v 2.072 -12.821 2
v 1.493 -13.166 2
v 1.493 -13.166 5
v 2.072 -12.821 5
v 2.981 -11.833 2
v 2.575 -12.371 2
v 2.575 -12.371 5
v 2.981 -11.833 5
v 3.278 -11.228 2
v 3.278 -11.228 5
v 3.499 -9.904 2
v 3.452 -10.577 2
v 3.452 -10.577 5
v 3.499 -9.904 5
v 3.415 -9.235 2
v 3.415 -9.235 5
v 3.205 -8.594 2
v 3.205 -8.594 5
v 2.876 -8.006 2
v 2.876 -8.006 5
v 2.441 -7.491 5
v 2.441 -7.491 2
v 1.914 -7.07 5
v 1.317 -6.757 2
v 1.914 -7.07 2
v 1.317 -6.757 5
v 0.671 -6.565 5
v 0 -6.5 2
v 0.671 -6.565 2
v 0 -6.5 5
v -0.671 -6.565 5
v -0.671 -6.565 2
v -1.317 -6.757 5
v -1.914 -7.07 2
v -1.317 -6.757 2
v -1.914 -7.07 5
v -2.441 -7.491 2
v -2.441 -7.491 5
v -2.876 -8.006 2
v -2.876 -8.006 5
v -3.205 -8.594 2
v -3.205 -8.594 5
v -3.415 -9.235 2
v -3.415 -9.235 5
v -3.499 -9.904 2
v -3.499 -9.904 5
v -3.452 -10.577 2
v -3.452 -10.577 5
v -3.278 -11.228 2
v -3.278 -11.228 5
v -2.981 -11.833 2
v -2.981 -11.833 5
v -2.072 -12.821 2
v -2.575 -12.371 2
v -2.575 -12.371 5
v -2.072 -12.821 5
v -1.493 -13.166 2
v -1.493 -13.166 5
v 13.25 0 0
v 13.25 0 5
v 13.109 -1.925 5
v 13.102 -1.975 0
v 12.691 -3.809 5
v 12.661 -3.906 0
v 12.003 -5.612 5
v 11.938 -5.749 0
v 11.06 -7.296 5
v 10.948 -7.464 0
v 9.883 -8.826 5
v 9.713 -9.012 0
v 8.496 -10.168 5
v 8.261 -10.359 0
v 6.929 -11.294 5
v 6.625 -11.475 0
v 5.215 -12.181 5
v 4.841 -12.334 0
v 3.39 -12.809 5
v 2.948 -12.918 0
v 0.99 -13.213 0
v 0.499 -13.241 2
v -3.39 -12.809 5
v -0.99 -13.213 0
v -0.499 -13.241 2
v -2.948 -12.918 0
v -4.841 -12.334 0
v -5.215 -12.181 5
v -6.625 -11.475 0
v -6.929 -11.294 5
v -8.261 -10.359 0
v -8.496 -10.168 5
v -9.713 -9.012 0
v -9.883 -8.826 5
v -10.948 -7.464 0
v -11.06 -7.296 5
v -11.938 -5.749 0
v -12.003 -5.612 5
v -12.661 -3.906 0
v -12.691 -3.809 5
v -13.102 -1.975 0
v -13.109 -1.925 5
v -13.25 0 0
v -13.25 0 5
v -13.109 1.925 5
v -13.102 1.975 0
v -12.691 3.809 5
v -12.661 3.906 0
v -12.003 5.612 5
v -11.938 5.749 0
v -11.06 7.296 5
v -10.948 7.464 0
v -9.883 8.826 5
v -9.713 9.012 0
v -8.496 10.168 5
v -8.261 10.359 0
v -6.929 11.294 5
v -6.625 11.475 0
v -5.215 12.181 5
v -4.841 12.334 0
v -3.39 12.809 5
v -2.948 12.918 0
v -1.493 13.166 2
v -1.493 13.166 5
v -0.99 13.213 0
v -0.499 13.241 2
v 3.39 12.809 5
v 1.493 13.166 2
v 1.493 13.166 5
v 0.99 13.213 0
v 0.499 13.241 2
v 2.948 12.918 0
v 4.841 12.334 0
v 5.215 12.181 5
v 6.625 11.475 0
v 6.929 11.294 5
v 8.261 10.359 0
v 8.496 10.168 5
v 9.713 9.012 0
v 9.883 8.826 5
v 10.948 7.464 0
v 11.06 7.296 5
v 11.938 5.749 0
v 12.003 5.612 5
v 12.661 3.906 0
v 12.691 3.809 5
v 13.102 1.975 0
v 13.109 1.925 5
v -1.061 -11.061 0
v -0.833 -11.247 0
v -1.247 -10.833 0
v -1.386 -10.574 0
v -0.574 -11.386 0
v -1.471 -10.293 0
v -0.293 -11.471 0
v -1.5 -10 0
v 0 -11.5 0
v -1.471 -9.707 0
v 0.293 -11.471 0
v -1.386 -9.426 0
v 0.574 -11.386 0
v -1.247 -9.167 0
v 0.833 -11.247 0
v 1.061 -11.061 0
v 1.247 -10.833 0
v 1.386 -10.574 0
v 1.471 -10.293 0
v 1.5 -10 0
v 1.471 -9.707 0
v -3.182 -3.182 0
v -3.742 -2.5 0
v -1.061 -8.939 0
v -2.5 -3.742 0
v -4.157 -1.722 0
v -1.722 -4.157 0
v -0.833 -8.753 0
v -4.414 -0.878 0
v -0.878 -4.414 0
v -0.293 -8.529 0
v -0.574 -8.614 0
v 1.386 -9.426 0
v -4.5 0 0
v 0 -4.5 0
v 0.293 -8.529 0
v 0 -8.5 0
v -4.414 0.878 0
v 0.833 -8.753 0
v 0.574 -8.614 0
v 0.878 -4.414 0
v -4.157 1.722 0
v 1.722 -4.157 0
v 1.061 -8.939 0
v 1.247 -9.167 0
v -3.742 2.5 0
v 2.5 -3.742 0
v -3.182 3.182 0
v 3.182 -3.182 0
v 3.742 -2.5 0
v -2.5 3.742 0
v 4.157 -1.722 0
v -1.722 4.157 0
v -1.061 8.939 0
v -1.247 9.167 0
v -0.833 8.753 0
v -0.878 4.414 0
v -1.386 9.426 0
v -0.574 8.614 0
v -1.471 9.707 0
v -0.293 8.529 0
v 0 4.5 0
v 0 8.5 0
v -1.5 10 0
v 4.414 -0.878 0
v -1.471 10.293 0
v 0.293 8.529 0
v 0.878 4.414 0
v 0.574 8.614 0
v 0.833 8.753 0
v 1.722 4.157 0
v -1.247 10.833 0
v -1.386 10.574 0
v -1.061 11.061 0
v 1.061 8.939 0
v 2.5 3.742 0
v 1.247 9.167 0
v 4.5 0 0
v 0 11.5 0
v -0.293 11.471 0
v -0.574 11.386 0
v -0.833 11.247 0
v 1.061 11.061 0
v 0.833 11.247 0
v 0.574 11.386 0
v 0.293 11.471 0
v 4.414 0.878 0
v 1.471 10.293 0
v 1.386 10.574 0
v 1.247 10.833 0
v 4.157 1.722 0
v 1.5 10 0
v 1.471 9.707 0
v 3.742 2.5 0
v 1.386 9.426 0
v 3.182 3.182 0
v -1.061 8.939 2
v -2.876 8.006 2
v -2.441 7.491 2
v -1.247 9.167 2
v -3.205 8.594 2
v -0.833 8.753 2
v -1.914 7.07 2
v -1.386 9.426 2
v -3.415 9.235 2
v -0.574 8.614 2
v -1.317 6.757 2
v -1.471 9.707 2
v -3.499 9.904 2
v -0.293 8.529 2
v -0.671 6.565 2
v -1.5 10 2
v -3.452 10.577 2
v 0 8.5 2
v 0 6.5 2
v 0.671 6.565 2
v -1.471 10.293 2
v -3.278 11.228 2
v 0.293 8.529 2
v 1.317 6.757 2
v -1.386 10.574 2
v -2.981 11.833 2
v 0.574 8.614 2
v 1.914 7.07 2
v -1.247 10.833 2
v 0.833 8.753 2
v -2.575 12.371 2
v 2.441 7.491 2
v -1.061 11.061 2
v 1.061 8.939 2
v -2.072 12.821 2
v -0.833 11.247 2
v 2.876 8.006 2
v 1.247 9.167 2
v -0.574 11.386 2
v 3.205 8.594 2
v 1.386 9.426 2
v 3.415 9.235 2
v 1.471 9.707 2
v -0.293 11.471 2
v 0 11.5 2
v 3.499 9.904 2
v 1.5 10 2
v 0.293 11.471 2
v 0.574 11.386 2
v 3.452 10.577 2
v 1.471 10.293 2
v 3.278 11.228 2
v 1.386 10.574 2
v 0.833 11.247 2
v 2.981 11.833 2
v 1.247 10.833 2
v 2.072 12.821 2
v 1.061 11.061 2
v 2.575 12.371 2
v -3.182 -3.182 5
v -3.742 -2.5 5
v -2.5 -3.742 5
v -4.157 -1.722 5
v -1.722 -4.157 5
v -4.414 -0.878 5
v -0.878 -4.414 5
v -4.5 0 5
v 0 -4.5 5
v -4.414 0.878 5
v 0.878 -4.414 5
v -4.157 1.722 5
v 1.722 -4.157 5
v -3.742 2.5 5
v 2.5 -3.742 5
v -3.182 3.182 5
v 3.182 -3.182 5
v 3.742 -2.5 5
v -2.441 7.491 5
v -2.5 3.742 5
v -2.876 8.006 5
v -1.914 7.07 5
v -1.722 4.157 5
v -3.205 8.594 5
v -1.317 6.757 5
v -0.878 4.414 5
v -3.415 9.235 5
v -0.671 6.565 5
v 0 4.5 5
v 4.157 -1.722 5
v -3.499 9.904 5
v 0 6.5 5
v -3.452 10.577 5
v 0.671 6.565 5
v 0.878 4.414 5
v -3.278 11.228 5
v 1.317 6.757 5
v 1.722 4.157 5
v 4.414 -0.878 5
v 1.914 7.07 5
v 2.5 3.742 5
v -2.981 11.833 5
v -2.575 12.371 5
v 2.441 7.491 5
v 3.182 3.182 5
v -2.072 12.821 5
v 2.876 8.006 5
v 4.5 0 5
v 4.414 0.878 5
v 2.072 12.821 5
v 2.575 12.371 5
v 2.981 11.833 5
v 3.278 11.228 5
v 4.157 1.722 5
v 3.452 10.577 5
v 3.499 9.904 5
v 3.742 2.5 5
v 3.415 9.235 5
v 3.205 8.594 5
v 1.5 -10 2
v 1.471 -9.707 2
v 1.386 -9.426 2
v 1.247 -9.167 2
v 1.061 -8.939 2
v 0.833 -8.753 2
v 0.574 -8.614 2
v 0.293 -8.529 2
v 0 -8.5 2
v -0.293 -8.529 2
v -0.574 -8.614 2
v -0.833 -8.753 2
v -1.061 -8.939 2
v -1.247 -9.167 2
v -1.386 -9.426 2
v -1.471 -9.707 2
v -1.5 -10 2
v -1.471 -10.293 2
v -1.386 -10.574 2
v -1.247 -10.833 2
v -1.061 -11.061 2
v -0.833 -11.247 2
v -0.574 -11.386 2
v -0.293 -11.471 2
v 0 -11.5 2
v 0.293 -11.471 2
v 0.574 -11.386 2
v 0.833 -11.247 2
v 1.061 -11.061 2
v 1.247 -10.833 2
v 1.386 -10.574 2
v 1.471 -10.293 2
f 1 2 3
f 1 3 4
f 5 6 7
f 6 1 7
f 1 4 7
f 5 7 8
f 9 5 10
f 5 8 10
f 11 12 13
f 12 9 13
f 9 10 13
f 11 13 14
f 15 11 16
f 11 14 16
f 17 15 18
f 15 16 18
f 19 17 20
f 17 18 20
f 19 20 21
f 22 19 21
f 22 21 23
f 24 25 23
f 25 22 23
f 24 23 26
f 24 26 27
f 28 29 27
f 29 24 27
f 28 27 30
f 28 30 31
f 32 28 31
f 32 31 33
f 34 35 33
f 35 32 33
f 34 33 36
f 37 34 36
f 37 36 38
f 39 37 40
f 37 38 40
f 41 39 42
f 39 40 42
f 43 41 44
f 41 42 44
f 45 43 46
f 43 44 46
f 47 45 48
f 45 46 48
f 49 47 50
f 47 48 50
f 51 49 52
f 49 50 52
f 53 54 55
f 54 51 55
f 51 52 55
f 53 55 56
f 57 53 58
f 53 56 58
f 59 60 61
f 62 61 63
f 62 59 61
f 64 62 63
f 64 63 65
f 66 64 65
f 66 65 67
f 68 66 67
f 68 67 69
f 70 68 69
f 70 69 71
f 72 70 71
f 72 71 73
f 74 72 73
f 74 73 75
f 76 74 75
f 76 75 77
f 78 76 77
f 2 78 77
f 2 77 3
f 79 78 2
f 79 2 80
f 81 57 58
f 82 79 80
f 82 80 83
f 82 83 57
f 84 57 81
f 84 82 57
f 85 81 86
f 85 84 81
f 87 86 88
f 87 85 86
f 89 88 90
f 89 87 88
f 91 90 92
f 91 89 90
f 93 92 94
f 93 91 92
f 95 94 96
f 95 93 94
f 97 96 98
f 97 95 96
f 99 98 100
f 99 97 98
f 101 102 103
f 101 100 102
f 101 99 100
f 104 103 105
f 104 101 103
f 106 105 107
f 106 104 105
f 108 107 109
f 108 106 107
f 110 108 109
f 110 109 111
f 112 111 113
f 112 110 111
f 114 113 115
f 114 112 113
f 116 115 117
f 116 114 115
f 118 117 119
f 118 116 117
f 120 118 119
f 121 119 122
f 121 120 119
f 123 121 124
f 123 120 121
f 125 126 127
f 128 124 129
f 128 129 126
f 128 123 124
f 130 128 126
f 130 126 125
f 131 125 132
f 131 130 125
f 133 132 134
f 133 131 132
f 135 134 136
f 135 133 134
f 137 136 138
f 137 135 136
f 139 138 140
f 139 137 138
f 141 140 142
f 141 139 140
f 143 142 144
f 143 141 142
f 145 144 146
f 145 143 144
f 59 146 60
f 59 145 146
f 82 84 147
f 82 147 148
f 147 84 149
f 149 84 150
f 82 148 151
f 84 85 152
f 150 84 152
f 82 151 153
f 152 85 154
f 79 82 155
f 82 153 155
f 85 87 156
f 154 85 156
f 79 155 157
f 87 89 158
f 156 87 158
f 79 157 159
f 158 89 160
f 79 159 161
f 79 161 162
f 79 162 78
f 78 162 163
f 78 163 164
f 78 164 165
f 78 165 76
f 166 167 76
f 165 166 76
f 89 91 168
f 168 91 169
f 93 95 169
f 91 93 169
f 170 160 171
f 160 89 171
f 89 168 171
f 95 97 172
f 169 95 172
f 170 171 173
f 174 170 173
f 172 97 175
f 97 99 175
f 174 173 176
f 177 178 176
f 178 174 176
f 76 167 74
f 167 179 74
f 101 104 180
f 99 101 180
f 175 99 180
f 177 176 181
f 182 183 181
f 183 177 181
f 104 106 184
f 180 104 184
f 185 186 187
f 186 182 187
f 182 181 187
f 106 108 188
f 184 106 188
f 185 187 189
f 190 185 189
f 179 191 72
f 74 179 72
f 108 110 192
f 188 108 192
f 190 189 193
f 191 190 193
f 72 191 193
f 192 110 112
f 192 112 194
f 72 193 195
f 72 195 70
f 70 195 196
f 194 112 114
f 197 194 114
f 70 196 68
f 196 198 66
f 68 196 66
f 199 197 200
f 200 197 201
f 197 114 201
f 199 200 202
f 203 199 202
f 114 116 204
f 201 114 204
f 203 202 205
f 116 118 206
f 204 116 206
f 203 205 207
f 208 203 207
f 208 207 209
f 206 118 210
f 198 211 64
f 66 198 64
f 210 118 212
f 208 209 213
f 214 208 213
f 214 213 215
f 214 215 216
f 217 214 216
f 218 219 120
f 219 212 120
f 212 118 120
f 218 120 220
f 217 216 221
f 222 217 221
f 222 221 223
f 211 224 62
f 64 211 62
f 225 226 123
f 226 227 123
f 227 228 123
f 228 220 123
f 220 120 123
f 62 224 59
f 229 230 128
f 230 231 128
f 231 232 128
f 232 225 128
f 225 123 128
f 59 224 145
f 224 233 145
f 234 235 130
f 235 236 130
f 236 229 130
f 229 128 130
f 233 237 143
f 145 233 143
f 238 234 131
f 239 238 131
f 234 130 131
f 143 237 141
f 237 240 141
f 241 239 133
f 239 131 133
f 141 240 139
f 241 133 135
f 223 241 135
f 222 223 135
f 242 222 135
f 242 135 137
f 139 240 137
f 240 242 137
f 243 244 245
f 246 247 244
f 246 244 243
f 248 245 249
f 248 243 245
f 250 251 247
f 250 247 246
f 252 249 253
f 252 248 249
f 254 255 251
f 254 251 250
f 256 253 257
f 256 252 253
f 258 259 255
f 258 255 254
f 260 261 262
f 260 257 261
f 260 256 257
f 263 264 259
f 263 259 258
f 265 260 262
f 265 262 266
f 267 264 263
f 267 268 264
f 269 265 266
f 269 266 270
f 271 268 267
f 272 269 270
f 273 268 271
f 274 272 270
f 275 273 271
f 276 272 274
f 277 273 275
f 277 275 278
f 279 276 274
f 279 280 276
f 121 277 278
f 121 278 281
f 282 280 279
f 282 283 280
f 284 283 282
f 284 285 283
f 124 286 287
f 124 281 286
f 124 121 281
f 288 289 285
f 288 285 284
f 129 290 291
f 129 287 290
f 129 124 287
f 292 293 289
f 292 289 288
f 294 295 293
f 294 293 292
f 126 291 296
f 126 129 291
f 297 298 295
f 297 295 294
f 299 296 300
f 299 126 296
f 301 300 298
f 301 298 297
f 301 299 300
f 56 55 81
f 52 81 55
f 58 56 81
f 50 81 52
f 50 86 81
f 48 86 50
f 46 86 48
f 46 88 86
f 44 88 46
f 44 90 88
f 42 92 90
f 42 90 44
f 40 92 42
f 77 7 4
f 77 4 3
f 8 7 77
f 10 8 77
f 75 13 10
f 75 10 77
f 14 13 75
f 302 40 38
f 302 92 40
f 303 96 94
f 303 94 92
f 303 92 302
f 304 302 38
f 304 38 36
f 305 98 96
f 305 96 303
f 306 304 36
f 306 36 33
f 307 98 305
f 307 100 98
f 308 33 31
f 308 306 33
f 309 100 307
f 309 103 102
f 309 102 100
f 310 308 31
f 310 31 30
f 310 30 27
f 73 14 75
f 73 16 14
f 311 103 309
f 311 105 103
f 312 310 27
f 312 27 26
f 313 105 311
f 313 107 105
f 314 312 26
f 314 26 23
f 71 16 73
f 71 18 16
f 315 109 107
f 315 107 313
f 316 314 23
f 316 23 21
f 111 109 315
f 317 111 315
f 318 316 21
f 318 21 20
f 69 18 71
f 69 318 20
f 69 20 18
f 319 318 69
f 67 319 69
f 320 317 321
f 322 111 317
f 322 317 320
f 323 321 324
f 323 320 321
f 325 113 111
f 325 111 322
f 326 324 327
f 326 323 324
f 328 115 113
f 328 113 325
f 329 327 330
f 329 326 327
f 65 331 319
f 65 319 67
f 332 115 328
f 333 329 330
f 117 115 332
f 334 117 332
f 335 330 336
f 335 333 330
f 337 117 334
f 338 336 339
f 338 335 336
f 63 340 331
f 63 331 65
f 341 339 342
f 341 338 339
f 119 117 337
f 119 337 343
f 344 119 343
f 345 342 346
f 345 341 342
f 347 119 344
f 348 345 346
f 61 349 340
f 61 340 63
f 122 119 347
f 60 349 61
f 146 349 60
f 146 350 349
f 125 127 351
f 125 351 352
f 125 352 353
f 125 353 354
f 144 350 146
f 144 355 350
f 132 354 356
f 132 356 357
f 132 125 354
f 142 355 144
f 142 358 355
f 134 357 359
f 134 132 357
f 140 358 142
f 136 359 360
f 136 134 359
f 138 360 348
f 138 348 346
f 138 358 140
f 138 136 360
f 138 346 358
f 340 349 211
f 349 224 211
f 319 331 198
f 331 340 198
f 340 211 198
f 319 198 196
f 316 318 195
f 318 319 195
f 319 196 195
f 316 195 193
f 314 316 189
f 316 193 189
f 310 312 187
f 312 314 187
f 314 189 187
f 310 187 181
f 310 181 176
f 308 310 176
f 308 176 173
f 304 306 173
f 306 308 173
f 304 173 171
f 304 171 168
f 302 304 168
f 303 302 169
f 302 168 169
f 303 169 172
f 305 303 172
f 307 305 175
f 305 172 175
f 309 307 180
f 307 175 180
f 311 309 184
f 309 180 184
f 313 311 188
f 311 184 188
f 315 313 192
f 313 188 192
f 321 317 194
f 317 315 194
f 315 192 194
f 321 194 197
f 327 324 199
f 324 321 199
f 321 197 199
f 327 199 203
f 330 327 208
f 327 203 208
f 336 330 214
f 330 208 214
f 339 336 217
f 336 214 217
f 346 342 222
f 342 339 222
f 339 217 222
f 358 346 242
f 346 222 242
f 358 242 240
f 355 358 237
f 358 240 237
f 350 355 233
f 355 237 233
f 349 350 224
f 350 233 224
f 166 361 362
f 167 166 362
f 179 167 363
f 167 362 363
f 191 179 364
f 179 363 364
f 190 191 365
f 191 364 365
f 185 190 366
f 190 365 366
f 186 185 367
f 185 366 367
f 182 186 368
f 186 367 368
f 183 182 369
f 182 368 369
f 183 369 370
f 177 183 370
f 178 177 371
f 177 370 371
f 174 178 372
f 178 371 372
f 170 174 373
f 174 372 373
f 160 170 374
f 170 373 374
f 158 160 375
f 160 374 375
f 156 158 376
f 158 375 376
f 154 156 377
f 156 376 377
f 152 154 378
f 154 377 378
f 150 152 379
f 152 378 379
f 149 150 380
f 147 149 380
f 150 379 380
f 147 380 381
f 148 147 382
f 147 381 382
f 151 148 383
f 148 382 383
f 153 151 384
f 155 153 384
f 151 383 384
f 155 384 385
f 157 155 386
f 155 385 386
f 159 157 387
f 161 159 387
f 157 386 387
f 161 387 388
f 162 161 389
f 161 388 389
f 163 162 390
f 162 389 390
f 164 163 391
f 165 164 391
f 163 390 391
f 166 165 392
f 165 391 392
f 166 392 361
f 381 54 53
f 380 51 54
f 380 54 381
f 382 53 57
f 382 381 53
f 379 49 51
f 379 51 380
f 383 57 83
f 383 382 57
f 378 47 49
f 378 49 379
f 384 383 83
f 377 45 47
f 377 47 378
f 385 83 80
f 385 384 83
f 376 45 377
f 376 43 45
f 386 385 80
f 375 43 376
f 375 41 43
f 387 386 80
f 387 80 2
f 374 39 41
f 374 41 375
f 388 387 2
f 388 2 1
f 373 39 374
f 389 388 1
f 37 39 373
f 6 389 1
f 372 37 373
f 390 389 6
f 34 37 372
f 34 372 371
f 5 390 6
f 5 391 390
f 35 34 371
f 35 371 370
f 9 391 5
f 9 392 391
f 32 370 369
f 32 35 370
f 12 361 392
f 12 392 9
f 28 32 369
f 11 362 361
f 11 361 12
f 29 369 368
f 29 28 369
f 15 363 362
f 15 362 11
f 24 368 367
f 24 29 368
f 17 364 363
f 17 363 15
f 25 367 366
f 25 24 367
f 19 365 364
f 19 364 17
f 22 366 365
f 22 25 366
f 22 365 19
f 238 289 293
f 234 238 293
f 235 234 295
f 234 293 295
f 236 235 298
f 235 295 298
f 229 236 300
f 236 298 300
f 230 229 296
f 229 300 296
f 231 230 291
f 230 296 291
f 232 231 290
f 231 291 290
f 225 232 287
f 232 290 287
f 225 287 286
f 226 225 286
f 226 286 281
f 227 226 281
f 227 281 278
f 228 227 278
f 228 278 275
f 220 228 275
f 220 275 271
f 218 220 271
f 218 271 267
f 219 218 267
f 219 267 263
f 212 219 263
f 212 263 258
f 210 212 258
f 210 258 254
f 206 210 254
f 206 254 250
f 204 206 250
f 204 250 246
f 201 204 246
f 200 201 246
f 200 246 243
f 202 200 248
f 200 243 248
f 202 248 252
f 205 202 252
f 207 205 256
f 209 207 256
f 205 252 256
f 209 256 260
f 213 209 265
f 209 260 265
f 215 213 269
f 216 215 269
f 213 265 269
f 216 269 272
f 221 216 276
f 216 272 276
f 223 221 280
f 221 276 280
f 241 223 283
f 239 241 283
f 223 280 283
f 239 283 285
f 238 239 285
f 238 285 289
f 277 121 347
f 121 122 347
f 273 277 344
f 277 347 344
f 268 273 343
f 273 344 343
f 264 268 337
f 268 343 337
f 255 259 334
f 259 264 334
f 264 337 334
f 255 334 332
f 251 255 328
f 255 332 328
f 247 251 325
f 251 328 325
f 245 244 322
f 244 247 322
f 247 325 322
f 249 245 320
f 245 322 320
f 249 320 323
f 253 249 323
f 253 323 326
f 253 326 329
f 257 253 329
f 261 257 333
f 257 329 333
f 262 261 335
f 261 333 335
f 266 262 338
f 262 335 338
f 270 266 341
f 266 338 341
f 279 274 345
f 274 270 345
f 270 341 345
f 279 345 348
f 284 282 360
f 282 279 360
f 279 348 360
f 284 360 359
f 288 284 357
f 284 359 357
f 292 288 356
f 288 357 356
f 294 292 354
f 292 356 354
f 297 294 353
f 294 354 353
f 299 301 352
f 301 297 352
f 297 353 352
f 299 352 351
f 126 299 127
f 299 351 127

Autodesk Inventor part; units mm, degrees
ref_plane "YZ Plane" through (0, 0, 0) normal (1, 0, 0) x (0, 1, 0)
ref_plane "XZ Plane" through (0, 0, 0) normal (0, 1, 0) x (-1, 0, 0)
ref_plane "XY Plane" through (0, 0, 0) normal (0, 0, 1) x (1, 0, 0)
sketch "Sketch1" plane through (0, 0, 0) normal (0, 0, 1) x (1, 0, 0)
  circle A0 centre (0, 0) radius 13.25
  circle A1 centre (0, 0) radius 4.5
  dimension "d0" = 26.5
  dimension "d1" = 9
extrude "Extrusion1" add sketch "Sketch1" along normal blind 5
sketch "Sketch2" plane through (0, 0, 5) normal (0, 0, 1) x (1, 0, 0)
  circle A0 centre (0, 10) radius 1.5
  circle A1 centre (0, -10) radius 1.5
  circle A2 centre (0, 0) radius 10 construction
  dimension "d4" = 3
  dimension "d5" = 3
  dimension "d6" = 20
extrude "Extrusion2" cut sketch "Sketch2" against normal through all
sketch "Sketch3" plane through (0, 0, 5) normal (0, 0, 1) x (1, 0, 0)
  circle A0 centre (0, 10) radius 1.5 projected
  circle A1 centre (0, -10) radius 1.5 projected
  circle A2 centre (0, 10) radius 3.5
  circle A3 centre (0, -10) radius 3.5
  point P0 (0, 0)
  dimension "d9" = 7
  dimension "d10" = 7
extrude "Extrusion3" cut sketch "Sketch3" against normal blind 3
properties part number "AA028" material "ABS Plastic"
